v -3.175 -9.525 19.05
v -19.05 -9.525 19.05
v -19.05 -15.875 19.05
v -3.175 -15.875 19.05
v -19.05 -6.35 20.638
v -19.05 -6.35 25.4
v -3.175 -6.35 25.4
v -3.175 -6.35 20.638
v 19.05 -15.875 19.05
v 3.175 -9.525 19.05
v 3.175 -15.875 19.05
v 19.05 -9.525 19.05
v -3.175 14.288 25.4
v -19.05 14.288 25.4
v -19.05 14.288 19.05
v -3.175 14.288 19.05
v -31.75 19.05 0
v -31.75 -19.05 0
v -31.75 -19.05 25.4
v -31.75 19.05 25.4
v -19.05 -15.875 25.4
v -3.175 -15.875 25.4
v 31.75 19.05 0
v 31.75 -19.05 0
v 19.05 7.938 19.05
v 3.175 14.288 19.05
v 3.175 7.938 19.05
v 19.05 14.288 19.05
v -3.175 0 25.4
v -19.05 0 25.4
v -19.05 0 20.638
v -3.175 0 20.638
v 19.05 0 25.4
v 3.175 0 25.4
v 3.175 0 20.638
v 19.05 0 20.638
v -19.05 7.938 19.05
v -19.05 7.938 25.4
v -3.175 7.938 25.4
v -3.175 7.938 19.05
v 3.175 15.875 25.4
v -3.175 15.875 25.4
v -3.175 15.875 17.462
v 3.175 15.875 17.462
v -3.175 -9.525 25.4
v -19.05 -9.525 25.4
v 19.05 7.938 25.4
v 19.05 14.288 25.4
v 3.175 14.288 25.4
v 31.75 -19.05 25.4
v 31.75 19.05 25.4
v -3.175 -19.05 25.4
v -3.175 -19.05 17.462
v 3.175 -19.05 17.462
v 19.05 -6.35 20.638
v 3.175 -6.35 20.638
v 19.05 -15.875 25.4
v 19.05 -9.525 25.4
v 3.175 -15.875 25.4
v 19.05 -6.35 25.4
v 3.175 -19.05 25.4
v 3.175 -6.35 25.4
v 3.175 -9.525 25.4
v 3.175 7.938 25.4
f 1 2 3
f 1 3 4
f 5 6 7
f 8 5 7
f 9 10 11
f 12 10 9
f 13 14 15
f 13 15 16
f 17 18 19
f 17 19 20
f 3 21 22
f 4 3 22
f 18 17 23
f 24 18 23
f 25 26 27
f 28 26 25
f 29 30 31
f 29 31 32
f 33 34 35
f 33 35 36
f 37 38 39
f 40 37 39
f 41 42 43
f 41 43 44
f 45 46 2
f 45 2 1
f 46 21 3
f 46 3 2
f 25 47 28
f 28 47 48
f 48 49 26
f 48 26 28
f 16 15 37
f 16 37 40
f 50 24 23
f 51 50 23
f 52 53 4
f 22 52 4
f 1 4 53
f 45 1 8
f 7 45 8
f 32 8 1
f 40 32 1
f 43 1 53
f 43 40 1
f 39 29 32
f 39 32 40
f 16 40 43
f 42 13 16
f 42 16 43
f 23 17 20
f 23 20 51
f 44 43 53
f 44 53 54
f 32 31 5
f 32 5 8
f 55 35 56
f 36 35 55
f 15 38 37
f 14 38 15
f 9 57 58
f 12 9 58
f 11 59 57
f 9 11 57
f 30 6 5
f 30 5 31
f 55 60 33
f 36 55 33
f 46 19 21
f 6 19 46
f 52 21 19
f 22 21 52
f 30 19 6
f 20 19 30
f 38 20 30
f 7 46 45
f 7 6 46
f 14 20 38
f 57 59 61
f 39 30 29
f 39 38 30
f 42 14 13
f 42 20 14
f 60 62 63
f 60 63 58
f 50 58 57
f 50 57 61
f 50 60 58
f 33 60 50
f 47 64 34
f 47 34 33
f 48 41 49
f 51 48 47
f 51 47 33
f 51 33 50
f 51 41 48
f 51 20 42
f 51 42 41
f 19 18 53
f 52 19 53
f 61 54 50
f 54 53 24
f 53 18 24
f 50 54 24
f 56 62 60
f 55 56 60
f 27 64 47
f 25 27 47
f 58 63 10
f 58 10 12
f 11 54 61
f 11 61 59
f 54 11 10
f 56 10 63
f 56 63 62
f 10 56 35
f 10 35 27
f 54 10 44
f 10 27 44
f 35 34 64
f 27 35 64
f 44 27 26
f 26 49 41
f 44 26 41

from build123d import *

# Parameters (mm, degrees)
F0_W     = 63.5
F0_H     = 38.1
F1_DEPTH = 25.4
F2_W     = 6.35
F2_H     = 34.925
F4_DEPTH = 7.9375
F3_W     = 15.875
F3_H     = 6.35
F5_DEPTH = 6.35
F6_DEPTH = 4.7625


# Not quite as in the source:
# - a length typed as a fraction of an inch, garbled in the dataset ("3 / 203.2 mm" for 3/8 in), is restored


with BuildPart() as f1:
    # F0 (on Top) → F1 (new body)
    with BuildSketch(Plane.XY):
        Rectangle(F0_W, F0_H)
    extrude(amount=F1_DEPTH)

    # F2 (on face) → F4 (cut)
    with BuildSketch(Plane.XY.offset(25.4)):
        with Locations((0, -1.5875)):
            Rectangle(F2_W, F2_H)
    extrude(amount=-F4_DEPTH, mode=Mode.SUBTRACT)

    # F3 (on face) → F5 (cut)
    with BuildSketch(Plane.XY.offset(25.4)):
        with Locations((11.1125, 11.1125)):
            Rectangle(F3_W, F3_H)
        with Locations((-11.1125, 11.1125)):
            Rectangle(F3_W, F3_H)
        with Locations((11.1125, -12.7)):
            Rectangle(F3_W, F3_H)
        with Locations((-11.1125, -12.7)):
            Rectangle(F3_W, F3_H)
    extrude(amount=-F5_DEPTH, mode=Mode.SUBTRACT)

    # F3 (on face) → F6 (cut)
    with BuildSketch(Plane.XY.offset(25.4)):
        with Locations((11.1125, -3.175)):
            Rectangle(F3_W, F3_H)
        with Locations((-11.1125, -3.175)):
            Rectangle(F3_W, F3_H)
    extrude(amount=-F6_DEPTH, mode=Mode.SUBTRACT)


solid = f1.part
